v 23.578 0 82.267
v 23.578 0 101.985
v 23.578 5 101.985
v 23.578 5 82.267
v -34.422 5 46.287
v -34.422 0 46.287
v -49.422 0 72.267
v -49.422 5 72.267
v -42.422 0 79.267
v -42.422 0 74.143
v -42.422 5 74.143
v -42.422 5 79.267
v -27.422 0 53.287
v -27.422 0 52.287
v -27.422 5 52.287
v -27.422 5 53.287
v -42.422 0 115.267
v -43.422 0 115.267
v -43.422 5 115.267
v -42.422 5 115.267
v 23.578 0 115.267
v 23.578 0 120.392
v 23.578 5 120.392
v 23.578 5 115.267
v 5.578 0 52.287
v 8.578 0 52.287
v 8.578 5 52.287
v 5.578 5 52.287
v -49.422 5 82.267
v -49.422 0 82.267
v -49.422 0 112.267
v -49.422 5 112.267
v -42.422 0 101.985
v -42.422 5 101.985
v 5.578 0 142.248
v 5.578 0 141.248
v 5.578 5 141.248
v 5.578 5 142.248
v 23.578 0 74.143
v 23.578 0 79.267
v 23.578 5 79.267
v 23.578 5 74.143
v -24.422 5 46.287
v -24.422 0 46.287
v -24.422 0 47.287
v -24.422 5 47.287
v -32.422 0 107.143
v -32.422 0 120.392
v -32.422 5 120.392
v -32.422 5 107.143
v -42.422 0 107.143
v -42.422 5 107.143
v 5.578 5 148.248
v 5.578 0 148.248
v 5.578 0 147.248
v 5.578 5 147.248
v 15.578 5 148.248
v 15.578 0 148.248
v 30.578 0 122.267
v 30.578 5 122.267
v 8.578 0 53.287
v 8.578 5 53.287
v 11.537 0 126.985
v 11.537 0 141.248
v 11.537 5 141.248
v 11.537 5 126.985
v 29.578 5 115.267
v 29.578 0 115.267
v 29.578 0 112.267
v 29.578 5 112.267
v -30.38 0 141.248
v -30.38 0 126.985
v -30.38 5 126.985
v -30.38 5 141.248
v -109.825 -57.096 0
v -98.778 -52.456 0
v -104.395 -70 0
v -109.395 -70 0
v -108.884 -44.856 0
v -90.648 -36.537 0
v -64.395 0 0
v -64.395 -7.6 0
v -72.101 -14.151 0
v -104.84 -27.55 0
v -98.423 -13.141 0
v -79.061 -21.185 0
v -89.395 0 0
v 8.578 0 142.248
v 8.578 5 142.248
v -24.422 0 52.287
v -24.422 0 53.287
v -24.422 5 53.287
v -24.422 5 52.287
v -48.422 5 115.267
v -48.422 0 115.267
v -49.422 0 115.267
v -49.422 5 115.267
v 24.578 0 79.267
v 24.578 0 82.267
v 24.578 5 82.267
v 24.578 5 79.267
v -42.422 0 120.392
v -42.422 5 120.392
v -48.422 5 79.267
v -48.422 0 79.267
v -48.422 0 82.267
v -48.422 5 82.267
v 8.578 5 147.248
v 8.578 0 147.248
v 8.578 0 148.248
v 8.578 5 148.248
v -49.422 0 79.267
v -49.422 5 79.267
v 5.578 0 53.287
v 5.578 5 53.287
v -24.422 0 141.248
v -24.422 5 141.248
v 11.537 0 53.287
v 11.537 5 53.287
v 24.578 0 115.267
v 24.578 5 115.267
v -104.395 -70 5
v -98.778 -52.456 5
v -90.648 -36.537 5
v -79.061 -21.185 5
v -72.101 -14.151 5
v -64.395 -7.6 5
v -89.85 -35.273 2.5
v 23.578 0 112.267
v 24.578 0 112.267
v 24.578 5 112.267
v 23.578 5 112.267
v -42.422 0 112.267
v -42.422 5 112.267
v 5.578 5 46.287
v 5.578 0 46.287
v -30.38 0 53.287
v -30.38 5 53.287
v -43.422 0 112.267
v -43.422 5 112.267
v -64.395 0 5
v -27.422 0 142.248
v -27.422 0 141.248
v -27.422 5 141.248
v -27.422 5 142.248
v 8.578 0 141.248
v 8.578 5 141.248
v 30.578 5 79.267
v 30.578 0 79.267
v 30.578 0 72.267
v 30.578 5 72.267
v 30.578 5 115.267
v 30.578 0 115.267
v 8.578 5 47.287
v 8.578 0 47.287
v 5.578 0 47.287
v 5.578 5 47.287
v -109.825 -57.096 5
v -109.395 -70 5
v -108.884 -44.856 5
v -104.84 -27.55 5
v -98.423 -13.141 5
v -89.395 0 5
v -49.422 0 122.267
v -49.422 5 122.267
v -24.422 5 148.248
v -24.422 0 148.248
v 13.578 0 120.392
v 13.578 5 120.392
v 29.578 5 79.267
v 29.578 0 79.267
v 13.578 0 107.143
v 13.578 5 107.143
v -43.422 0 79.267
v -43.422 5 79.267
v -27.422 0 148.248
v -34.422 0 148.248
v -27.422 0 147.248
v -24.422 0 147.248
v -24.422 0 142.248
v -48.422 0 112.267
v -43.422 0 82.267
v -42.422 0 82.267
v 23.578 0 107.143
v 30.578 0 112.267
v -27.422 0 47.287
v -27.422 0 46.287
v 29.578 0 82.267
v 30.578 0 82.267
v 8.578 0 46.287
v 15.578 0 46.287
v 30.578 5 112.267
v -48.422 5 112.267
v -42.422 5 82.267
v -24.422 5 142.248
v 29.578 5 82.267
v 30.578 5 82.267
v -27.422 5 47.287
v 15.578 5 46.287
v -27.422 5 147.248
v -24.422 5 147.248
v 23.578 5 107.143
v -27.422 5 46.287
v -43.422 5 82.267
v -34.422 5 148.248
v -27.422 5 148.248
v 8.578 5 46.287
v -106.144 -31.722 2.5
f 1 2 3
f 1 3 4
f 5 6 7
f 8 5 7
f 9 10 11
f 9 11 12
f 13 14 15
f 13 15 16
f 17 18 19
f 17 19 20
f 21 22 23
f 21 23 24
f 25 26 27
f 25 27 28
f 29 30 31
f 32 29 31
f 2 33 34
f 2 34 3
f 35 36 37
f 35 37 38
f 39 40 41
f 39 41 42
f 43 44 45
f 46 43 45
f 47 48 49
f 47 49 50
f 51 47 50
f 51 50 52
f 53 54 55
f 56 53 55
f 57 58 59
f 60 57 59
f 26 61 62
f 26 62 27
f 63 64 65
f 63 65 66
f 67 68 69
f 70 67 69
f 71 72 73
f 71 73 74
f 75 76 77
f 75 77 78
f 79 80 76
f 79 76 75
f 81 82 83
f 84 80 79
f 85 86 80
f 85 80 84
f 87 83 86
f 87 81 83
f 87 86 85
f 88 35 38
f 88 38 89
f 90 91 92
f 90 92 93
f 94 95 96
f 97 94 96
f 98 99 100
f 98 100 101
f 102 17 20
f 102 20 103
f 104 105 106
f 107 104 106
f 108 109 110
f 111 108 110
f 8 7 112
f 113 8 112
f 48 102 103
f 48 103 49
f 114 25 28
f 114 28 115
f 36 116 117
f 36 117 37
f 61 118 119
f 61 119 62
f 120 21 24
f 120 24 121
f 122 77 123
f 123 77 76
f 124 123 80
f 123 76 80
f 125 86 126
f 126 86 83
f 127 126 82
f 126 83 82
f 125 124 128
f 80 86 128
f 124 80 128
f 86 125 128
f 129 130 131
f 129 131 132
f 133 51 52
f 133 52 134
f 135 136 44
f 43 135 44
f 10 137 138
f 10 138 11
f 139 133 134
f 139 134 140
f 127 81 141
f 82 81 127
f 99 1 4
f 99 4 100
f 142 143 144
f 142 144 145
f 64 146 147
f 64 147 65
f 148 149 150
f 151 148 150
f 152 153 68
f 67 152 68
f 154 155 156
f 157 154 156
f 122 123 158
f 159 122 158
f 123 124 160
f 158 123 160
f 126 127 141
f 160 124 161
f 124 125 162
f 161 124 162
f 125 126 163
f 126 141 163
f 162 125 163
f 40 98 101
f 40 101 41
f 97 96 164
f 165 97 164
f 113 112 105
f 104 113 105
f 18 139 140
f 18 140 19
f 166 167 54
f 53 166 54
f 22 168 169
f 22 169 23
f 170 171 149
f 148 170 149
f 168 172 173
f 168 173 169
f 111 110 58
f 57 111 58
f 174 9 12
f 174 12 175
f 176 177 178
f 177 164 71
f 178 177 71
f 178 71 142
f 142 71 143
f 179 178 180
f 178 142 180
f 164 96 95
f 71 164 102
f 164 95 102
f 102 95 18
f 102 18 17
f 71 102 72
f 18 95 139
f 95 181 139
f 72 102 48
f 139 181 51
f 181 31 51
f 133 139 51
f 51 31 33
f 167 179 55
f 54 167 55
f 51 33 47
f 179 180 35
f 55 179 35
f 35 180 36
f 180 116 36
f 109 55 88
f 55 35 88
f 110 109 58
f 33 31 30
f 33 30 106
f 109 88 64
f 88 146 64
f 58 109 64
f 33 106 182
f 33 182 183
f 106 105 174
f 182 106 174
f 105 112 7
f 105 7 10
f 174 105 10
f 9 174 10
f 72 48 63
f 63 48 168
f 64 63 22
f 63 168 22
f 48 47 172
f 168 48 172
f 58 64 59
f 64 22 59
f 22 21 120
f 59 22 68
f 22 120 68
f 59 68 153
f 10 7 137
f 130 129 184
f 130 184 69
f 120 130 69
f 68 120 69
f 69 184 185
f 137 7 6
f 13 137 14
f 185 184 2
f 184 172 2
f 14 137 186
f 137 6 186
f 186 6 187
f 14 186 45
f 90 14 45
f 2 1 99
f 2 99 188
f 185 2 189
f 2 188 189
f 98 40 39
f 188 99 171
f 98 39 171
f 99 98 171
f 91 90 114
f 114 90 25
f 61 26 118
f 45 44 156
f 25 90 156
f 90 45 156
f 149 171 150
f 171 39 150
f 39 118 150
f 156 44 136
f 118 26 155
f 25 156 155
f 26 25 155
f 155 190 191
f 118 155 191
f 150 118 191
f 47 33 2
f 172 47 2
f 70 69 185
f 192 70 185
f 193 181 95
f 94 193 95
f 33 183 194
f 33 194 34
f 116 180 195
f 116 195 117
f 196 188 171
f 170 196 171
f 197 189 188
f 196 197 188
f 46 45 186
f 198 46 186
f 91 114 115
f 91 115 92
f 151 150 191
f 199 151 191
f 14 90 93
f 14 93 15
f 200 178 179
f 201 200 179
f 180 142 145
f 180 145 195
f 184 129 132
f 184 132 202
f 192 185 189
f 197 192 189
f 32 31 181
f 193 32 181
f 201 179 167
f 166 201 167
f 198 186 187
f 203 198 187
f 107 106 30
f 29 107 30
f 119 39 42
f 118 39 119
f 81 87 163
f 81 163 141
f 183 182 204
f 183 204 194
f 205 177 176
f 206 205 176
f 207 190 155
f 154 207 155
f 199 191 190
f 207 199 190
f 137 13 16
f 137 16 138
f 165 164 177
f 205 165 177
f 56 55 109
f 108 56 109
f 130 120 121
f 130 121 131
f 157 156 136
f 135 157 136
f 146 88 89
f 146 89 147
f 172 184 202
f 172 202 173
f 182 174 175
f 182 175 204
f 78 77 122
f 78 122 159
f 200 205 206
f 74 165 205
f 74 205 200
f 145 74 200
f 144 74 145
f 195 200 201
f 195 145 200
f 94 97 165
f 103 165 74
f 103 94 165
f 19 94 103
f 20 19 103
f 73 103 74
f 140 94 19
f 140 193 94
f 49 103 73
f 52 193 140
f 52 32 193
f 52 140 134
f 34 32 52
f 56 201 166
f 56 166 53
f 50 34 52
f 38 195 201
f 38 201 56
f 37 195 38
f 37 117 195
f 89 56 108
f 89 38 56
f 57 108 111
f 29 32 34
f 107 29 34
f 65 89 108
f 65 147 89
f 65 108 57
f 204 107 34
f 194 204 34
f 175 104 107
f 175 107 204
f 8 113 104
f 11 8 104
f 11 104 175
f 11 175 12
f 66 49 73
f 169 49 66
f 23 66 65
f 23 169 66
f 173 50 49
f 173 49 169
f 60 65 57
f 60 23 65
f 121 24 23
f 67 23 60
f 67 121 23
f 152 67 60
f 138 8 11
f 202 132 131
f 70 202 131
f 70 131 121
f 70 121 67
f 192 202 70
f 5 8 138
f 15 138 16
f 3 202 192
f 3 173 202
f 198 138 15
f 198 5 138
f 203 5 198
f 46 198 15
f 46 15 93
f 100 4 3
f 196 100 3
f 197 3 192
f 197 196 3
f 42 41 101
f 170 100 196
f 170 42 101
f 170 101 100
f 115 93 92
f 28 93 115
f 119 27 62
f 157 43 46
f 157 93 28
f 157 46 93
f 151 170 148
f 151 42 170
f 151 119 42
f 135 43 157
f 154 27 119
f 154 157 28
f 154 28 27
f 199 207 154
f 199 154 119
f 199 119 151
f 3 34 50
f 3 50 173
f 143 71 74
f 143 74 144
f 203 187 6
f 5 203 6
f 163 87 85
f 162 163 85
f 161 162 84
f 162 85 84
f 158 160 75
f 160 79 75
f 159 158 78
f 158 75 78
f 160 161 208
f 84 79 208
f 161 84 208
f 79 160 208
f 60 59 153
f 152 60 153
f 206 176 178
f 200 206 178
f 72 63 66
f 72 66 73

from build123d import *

# Parameters (mm, degrees)
FOOT_DEPTH                       = 5
FEET_BASE_W_BATTERY_HOLDER_DEPTH = 5


with BuildPart() as part:
    # Esquisse1 → Foot (new body)
    with BuildSketch(Plane.XY):
        with BuildLine():
            Line((-89.395324531, 0), (-64.395324531, 0))
            Line((-64.395324531, 0), (-64.395324531, -7.6))
            add(Edge.make_bspline(
                [(-104.395324531, -70), (-95.305016455, -31.745468269), (-64.395324531, -7.6)],
                knots=[0, 0, 0, 1, 1, 1], degree=2))
            Line((-104.395324531, -70), (-109.395324531, -70))
            add(Edge.make_bspline(
                [(-89.395324531, 0), (-112.89262364, -28.444226906), (-109.395324531, -70)],
                knots=[0, 0, 0, 1, 1, 1], degree=2))
        make_face()
    extrude(amount=FOOT_DEPTH)


with BuildPart() as body_2:
    # Feet base w/ battery → Feet base w/battery holder (new body)
    with BuildSketch(Plane(origin=(0, 0, 0), x_dir=(1, 0, 0), z_dir=(0, 1, 0))):
        Polygon((-34.421633158, -148.248178954), (-27.421633158, -148.248178954), (-27.421633158, -147.248178954), (-24.421633158, -147.248178954), (-24.421633158, -148.248178954), (5.578366842, -148.248178954), (5.578366842, -147.248178954), (8.578366842, -147.248178954), (8.578366842, -148.248178954), (15.578366842, -148.248178954), (30.578366842, -122.267416841), (30.578366842, -115.267416841), (29.578366842, -115.267416841), (29.578366842, -112.267416841), (30.578366842, -112.267416841), (30.578366842, -82.267416841), (29.578366842, -82.267416841), (29.578366842, -79.267416841), (30.578366842, -79.267416841), (30.578366842, -72.267416841), (15.578366842, -46.286654727), (8.578366842, -46.286654727), (8.578366842, -47.286654727), (5.578366842, -47.286654727), (5.578366842, -46.286654727), (-24.421633158, -46.286654727), (-24.421633158, -47.286654727), (-27.421633158, -47.286654727), (-27.421633158, -46.286654727), (-34.421633158, -46.286654727), (-49.421633158, -72.267416841), (-49.421633158, -79.267416841), (-48.421633158, -79.267416841), (-48.421633158, -82.267416841), (-49.421633158, -82.267416841), (-49.421633158, -112.267416841), (-48.421633158, -112.267416841), (-48.421633158, -115.267416841), (-49.421633158, -115.267416841), (-49.421633158, -122.267416841), align=None)
        Polygon((-42.421633158, -115.267416841), (-42.421633158, -120.391772494), (-32.421633158, -120.391772494), (-32.421633158, -107.143061191), (-42.421633158, -107.143061191), (-42.421633158, -112.267416841), (-43.421633158, -112.267416841), (-43.421633158, -115.267416841), align=None, mode=Mode.SUBTRACT)
        Polygon((-42.421633158, -74.143061188), (-42.421633158, -79.267416841), (-43.421633158, -79.267416841), (-43.421633158, -82.267416841), (-42.421633158, -82.267416841), (-42.421633158, -101.984623152), (23.578366842, -101.984623152), (23.578366842, -82.267416841), (24.578366842, -82.267416841), (24.578366842, -79.267416841), (23.578366842, -79.267416841), (23.578366842, -74.143061188), (11.536914958, -53.286654727), (8.578366842, -53.286654727), (8.578366842, -52.286654727), (5.578366842, -52.286654727), (5.578366842, -53.286654727), (-24.421633158, -53.286654727), (-24.421633158, -52.286654727), (-27.421633158, -52.286654727), (-27.421633158, -53.286654727), (-30.380181274, -53.286654727), align=None, mode=Mode.SUBTRACT)
        Polygon((23.578366842, -120.391772494), (23.578366842, -115.267416841), (24.578366842, -115.267416841), (24.578366842, -112.267416841), (23.578366842, -112.267416841), (23.578366842, -107.143061191), (13.578366842, -107.143061191), (13.578366842, -120.391772494), align=None, mode=Mode.SUBTRACT)
        Polygon((8.578366842, -141.248178954), (11.536914958, -141.248178954), (11.536914958, -126.984623152), (-30.380181274, -126.984623152), (-30.380181274, -141.248178954), (-27.421633158, -141.248178954), (-27.421633158, -142.248178954), (-24.421633158, -142.248178954), (-24.421633158, -141.248178954), (5.578366842, -141.248178954), (5.578366842, -142.248178954), (8.578366842, -142.248178954), align=None, mode=Mode.SUBTRACT)
    extrude(amount=FEET_BASE_W_BATTERY_HOLDER_DEPTH)


solid = Compound([part.part, body_2.part])
